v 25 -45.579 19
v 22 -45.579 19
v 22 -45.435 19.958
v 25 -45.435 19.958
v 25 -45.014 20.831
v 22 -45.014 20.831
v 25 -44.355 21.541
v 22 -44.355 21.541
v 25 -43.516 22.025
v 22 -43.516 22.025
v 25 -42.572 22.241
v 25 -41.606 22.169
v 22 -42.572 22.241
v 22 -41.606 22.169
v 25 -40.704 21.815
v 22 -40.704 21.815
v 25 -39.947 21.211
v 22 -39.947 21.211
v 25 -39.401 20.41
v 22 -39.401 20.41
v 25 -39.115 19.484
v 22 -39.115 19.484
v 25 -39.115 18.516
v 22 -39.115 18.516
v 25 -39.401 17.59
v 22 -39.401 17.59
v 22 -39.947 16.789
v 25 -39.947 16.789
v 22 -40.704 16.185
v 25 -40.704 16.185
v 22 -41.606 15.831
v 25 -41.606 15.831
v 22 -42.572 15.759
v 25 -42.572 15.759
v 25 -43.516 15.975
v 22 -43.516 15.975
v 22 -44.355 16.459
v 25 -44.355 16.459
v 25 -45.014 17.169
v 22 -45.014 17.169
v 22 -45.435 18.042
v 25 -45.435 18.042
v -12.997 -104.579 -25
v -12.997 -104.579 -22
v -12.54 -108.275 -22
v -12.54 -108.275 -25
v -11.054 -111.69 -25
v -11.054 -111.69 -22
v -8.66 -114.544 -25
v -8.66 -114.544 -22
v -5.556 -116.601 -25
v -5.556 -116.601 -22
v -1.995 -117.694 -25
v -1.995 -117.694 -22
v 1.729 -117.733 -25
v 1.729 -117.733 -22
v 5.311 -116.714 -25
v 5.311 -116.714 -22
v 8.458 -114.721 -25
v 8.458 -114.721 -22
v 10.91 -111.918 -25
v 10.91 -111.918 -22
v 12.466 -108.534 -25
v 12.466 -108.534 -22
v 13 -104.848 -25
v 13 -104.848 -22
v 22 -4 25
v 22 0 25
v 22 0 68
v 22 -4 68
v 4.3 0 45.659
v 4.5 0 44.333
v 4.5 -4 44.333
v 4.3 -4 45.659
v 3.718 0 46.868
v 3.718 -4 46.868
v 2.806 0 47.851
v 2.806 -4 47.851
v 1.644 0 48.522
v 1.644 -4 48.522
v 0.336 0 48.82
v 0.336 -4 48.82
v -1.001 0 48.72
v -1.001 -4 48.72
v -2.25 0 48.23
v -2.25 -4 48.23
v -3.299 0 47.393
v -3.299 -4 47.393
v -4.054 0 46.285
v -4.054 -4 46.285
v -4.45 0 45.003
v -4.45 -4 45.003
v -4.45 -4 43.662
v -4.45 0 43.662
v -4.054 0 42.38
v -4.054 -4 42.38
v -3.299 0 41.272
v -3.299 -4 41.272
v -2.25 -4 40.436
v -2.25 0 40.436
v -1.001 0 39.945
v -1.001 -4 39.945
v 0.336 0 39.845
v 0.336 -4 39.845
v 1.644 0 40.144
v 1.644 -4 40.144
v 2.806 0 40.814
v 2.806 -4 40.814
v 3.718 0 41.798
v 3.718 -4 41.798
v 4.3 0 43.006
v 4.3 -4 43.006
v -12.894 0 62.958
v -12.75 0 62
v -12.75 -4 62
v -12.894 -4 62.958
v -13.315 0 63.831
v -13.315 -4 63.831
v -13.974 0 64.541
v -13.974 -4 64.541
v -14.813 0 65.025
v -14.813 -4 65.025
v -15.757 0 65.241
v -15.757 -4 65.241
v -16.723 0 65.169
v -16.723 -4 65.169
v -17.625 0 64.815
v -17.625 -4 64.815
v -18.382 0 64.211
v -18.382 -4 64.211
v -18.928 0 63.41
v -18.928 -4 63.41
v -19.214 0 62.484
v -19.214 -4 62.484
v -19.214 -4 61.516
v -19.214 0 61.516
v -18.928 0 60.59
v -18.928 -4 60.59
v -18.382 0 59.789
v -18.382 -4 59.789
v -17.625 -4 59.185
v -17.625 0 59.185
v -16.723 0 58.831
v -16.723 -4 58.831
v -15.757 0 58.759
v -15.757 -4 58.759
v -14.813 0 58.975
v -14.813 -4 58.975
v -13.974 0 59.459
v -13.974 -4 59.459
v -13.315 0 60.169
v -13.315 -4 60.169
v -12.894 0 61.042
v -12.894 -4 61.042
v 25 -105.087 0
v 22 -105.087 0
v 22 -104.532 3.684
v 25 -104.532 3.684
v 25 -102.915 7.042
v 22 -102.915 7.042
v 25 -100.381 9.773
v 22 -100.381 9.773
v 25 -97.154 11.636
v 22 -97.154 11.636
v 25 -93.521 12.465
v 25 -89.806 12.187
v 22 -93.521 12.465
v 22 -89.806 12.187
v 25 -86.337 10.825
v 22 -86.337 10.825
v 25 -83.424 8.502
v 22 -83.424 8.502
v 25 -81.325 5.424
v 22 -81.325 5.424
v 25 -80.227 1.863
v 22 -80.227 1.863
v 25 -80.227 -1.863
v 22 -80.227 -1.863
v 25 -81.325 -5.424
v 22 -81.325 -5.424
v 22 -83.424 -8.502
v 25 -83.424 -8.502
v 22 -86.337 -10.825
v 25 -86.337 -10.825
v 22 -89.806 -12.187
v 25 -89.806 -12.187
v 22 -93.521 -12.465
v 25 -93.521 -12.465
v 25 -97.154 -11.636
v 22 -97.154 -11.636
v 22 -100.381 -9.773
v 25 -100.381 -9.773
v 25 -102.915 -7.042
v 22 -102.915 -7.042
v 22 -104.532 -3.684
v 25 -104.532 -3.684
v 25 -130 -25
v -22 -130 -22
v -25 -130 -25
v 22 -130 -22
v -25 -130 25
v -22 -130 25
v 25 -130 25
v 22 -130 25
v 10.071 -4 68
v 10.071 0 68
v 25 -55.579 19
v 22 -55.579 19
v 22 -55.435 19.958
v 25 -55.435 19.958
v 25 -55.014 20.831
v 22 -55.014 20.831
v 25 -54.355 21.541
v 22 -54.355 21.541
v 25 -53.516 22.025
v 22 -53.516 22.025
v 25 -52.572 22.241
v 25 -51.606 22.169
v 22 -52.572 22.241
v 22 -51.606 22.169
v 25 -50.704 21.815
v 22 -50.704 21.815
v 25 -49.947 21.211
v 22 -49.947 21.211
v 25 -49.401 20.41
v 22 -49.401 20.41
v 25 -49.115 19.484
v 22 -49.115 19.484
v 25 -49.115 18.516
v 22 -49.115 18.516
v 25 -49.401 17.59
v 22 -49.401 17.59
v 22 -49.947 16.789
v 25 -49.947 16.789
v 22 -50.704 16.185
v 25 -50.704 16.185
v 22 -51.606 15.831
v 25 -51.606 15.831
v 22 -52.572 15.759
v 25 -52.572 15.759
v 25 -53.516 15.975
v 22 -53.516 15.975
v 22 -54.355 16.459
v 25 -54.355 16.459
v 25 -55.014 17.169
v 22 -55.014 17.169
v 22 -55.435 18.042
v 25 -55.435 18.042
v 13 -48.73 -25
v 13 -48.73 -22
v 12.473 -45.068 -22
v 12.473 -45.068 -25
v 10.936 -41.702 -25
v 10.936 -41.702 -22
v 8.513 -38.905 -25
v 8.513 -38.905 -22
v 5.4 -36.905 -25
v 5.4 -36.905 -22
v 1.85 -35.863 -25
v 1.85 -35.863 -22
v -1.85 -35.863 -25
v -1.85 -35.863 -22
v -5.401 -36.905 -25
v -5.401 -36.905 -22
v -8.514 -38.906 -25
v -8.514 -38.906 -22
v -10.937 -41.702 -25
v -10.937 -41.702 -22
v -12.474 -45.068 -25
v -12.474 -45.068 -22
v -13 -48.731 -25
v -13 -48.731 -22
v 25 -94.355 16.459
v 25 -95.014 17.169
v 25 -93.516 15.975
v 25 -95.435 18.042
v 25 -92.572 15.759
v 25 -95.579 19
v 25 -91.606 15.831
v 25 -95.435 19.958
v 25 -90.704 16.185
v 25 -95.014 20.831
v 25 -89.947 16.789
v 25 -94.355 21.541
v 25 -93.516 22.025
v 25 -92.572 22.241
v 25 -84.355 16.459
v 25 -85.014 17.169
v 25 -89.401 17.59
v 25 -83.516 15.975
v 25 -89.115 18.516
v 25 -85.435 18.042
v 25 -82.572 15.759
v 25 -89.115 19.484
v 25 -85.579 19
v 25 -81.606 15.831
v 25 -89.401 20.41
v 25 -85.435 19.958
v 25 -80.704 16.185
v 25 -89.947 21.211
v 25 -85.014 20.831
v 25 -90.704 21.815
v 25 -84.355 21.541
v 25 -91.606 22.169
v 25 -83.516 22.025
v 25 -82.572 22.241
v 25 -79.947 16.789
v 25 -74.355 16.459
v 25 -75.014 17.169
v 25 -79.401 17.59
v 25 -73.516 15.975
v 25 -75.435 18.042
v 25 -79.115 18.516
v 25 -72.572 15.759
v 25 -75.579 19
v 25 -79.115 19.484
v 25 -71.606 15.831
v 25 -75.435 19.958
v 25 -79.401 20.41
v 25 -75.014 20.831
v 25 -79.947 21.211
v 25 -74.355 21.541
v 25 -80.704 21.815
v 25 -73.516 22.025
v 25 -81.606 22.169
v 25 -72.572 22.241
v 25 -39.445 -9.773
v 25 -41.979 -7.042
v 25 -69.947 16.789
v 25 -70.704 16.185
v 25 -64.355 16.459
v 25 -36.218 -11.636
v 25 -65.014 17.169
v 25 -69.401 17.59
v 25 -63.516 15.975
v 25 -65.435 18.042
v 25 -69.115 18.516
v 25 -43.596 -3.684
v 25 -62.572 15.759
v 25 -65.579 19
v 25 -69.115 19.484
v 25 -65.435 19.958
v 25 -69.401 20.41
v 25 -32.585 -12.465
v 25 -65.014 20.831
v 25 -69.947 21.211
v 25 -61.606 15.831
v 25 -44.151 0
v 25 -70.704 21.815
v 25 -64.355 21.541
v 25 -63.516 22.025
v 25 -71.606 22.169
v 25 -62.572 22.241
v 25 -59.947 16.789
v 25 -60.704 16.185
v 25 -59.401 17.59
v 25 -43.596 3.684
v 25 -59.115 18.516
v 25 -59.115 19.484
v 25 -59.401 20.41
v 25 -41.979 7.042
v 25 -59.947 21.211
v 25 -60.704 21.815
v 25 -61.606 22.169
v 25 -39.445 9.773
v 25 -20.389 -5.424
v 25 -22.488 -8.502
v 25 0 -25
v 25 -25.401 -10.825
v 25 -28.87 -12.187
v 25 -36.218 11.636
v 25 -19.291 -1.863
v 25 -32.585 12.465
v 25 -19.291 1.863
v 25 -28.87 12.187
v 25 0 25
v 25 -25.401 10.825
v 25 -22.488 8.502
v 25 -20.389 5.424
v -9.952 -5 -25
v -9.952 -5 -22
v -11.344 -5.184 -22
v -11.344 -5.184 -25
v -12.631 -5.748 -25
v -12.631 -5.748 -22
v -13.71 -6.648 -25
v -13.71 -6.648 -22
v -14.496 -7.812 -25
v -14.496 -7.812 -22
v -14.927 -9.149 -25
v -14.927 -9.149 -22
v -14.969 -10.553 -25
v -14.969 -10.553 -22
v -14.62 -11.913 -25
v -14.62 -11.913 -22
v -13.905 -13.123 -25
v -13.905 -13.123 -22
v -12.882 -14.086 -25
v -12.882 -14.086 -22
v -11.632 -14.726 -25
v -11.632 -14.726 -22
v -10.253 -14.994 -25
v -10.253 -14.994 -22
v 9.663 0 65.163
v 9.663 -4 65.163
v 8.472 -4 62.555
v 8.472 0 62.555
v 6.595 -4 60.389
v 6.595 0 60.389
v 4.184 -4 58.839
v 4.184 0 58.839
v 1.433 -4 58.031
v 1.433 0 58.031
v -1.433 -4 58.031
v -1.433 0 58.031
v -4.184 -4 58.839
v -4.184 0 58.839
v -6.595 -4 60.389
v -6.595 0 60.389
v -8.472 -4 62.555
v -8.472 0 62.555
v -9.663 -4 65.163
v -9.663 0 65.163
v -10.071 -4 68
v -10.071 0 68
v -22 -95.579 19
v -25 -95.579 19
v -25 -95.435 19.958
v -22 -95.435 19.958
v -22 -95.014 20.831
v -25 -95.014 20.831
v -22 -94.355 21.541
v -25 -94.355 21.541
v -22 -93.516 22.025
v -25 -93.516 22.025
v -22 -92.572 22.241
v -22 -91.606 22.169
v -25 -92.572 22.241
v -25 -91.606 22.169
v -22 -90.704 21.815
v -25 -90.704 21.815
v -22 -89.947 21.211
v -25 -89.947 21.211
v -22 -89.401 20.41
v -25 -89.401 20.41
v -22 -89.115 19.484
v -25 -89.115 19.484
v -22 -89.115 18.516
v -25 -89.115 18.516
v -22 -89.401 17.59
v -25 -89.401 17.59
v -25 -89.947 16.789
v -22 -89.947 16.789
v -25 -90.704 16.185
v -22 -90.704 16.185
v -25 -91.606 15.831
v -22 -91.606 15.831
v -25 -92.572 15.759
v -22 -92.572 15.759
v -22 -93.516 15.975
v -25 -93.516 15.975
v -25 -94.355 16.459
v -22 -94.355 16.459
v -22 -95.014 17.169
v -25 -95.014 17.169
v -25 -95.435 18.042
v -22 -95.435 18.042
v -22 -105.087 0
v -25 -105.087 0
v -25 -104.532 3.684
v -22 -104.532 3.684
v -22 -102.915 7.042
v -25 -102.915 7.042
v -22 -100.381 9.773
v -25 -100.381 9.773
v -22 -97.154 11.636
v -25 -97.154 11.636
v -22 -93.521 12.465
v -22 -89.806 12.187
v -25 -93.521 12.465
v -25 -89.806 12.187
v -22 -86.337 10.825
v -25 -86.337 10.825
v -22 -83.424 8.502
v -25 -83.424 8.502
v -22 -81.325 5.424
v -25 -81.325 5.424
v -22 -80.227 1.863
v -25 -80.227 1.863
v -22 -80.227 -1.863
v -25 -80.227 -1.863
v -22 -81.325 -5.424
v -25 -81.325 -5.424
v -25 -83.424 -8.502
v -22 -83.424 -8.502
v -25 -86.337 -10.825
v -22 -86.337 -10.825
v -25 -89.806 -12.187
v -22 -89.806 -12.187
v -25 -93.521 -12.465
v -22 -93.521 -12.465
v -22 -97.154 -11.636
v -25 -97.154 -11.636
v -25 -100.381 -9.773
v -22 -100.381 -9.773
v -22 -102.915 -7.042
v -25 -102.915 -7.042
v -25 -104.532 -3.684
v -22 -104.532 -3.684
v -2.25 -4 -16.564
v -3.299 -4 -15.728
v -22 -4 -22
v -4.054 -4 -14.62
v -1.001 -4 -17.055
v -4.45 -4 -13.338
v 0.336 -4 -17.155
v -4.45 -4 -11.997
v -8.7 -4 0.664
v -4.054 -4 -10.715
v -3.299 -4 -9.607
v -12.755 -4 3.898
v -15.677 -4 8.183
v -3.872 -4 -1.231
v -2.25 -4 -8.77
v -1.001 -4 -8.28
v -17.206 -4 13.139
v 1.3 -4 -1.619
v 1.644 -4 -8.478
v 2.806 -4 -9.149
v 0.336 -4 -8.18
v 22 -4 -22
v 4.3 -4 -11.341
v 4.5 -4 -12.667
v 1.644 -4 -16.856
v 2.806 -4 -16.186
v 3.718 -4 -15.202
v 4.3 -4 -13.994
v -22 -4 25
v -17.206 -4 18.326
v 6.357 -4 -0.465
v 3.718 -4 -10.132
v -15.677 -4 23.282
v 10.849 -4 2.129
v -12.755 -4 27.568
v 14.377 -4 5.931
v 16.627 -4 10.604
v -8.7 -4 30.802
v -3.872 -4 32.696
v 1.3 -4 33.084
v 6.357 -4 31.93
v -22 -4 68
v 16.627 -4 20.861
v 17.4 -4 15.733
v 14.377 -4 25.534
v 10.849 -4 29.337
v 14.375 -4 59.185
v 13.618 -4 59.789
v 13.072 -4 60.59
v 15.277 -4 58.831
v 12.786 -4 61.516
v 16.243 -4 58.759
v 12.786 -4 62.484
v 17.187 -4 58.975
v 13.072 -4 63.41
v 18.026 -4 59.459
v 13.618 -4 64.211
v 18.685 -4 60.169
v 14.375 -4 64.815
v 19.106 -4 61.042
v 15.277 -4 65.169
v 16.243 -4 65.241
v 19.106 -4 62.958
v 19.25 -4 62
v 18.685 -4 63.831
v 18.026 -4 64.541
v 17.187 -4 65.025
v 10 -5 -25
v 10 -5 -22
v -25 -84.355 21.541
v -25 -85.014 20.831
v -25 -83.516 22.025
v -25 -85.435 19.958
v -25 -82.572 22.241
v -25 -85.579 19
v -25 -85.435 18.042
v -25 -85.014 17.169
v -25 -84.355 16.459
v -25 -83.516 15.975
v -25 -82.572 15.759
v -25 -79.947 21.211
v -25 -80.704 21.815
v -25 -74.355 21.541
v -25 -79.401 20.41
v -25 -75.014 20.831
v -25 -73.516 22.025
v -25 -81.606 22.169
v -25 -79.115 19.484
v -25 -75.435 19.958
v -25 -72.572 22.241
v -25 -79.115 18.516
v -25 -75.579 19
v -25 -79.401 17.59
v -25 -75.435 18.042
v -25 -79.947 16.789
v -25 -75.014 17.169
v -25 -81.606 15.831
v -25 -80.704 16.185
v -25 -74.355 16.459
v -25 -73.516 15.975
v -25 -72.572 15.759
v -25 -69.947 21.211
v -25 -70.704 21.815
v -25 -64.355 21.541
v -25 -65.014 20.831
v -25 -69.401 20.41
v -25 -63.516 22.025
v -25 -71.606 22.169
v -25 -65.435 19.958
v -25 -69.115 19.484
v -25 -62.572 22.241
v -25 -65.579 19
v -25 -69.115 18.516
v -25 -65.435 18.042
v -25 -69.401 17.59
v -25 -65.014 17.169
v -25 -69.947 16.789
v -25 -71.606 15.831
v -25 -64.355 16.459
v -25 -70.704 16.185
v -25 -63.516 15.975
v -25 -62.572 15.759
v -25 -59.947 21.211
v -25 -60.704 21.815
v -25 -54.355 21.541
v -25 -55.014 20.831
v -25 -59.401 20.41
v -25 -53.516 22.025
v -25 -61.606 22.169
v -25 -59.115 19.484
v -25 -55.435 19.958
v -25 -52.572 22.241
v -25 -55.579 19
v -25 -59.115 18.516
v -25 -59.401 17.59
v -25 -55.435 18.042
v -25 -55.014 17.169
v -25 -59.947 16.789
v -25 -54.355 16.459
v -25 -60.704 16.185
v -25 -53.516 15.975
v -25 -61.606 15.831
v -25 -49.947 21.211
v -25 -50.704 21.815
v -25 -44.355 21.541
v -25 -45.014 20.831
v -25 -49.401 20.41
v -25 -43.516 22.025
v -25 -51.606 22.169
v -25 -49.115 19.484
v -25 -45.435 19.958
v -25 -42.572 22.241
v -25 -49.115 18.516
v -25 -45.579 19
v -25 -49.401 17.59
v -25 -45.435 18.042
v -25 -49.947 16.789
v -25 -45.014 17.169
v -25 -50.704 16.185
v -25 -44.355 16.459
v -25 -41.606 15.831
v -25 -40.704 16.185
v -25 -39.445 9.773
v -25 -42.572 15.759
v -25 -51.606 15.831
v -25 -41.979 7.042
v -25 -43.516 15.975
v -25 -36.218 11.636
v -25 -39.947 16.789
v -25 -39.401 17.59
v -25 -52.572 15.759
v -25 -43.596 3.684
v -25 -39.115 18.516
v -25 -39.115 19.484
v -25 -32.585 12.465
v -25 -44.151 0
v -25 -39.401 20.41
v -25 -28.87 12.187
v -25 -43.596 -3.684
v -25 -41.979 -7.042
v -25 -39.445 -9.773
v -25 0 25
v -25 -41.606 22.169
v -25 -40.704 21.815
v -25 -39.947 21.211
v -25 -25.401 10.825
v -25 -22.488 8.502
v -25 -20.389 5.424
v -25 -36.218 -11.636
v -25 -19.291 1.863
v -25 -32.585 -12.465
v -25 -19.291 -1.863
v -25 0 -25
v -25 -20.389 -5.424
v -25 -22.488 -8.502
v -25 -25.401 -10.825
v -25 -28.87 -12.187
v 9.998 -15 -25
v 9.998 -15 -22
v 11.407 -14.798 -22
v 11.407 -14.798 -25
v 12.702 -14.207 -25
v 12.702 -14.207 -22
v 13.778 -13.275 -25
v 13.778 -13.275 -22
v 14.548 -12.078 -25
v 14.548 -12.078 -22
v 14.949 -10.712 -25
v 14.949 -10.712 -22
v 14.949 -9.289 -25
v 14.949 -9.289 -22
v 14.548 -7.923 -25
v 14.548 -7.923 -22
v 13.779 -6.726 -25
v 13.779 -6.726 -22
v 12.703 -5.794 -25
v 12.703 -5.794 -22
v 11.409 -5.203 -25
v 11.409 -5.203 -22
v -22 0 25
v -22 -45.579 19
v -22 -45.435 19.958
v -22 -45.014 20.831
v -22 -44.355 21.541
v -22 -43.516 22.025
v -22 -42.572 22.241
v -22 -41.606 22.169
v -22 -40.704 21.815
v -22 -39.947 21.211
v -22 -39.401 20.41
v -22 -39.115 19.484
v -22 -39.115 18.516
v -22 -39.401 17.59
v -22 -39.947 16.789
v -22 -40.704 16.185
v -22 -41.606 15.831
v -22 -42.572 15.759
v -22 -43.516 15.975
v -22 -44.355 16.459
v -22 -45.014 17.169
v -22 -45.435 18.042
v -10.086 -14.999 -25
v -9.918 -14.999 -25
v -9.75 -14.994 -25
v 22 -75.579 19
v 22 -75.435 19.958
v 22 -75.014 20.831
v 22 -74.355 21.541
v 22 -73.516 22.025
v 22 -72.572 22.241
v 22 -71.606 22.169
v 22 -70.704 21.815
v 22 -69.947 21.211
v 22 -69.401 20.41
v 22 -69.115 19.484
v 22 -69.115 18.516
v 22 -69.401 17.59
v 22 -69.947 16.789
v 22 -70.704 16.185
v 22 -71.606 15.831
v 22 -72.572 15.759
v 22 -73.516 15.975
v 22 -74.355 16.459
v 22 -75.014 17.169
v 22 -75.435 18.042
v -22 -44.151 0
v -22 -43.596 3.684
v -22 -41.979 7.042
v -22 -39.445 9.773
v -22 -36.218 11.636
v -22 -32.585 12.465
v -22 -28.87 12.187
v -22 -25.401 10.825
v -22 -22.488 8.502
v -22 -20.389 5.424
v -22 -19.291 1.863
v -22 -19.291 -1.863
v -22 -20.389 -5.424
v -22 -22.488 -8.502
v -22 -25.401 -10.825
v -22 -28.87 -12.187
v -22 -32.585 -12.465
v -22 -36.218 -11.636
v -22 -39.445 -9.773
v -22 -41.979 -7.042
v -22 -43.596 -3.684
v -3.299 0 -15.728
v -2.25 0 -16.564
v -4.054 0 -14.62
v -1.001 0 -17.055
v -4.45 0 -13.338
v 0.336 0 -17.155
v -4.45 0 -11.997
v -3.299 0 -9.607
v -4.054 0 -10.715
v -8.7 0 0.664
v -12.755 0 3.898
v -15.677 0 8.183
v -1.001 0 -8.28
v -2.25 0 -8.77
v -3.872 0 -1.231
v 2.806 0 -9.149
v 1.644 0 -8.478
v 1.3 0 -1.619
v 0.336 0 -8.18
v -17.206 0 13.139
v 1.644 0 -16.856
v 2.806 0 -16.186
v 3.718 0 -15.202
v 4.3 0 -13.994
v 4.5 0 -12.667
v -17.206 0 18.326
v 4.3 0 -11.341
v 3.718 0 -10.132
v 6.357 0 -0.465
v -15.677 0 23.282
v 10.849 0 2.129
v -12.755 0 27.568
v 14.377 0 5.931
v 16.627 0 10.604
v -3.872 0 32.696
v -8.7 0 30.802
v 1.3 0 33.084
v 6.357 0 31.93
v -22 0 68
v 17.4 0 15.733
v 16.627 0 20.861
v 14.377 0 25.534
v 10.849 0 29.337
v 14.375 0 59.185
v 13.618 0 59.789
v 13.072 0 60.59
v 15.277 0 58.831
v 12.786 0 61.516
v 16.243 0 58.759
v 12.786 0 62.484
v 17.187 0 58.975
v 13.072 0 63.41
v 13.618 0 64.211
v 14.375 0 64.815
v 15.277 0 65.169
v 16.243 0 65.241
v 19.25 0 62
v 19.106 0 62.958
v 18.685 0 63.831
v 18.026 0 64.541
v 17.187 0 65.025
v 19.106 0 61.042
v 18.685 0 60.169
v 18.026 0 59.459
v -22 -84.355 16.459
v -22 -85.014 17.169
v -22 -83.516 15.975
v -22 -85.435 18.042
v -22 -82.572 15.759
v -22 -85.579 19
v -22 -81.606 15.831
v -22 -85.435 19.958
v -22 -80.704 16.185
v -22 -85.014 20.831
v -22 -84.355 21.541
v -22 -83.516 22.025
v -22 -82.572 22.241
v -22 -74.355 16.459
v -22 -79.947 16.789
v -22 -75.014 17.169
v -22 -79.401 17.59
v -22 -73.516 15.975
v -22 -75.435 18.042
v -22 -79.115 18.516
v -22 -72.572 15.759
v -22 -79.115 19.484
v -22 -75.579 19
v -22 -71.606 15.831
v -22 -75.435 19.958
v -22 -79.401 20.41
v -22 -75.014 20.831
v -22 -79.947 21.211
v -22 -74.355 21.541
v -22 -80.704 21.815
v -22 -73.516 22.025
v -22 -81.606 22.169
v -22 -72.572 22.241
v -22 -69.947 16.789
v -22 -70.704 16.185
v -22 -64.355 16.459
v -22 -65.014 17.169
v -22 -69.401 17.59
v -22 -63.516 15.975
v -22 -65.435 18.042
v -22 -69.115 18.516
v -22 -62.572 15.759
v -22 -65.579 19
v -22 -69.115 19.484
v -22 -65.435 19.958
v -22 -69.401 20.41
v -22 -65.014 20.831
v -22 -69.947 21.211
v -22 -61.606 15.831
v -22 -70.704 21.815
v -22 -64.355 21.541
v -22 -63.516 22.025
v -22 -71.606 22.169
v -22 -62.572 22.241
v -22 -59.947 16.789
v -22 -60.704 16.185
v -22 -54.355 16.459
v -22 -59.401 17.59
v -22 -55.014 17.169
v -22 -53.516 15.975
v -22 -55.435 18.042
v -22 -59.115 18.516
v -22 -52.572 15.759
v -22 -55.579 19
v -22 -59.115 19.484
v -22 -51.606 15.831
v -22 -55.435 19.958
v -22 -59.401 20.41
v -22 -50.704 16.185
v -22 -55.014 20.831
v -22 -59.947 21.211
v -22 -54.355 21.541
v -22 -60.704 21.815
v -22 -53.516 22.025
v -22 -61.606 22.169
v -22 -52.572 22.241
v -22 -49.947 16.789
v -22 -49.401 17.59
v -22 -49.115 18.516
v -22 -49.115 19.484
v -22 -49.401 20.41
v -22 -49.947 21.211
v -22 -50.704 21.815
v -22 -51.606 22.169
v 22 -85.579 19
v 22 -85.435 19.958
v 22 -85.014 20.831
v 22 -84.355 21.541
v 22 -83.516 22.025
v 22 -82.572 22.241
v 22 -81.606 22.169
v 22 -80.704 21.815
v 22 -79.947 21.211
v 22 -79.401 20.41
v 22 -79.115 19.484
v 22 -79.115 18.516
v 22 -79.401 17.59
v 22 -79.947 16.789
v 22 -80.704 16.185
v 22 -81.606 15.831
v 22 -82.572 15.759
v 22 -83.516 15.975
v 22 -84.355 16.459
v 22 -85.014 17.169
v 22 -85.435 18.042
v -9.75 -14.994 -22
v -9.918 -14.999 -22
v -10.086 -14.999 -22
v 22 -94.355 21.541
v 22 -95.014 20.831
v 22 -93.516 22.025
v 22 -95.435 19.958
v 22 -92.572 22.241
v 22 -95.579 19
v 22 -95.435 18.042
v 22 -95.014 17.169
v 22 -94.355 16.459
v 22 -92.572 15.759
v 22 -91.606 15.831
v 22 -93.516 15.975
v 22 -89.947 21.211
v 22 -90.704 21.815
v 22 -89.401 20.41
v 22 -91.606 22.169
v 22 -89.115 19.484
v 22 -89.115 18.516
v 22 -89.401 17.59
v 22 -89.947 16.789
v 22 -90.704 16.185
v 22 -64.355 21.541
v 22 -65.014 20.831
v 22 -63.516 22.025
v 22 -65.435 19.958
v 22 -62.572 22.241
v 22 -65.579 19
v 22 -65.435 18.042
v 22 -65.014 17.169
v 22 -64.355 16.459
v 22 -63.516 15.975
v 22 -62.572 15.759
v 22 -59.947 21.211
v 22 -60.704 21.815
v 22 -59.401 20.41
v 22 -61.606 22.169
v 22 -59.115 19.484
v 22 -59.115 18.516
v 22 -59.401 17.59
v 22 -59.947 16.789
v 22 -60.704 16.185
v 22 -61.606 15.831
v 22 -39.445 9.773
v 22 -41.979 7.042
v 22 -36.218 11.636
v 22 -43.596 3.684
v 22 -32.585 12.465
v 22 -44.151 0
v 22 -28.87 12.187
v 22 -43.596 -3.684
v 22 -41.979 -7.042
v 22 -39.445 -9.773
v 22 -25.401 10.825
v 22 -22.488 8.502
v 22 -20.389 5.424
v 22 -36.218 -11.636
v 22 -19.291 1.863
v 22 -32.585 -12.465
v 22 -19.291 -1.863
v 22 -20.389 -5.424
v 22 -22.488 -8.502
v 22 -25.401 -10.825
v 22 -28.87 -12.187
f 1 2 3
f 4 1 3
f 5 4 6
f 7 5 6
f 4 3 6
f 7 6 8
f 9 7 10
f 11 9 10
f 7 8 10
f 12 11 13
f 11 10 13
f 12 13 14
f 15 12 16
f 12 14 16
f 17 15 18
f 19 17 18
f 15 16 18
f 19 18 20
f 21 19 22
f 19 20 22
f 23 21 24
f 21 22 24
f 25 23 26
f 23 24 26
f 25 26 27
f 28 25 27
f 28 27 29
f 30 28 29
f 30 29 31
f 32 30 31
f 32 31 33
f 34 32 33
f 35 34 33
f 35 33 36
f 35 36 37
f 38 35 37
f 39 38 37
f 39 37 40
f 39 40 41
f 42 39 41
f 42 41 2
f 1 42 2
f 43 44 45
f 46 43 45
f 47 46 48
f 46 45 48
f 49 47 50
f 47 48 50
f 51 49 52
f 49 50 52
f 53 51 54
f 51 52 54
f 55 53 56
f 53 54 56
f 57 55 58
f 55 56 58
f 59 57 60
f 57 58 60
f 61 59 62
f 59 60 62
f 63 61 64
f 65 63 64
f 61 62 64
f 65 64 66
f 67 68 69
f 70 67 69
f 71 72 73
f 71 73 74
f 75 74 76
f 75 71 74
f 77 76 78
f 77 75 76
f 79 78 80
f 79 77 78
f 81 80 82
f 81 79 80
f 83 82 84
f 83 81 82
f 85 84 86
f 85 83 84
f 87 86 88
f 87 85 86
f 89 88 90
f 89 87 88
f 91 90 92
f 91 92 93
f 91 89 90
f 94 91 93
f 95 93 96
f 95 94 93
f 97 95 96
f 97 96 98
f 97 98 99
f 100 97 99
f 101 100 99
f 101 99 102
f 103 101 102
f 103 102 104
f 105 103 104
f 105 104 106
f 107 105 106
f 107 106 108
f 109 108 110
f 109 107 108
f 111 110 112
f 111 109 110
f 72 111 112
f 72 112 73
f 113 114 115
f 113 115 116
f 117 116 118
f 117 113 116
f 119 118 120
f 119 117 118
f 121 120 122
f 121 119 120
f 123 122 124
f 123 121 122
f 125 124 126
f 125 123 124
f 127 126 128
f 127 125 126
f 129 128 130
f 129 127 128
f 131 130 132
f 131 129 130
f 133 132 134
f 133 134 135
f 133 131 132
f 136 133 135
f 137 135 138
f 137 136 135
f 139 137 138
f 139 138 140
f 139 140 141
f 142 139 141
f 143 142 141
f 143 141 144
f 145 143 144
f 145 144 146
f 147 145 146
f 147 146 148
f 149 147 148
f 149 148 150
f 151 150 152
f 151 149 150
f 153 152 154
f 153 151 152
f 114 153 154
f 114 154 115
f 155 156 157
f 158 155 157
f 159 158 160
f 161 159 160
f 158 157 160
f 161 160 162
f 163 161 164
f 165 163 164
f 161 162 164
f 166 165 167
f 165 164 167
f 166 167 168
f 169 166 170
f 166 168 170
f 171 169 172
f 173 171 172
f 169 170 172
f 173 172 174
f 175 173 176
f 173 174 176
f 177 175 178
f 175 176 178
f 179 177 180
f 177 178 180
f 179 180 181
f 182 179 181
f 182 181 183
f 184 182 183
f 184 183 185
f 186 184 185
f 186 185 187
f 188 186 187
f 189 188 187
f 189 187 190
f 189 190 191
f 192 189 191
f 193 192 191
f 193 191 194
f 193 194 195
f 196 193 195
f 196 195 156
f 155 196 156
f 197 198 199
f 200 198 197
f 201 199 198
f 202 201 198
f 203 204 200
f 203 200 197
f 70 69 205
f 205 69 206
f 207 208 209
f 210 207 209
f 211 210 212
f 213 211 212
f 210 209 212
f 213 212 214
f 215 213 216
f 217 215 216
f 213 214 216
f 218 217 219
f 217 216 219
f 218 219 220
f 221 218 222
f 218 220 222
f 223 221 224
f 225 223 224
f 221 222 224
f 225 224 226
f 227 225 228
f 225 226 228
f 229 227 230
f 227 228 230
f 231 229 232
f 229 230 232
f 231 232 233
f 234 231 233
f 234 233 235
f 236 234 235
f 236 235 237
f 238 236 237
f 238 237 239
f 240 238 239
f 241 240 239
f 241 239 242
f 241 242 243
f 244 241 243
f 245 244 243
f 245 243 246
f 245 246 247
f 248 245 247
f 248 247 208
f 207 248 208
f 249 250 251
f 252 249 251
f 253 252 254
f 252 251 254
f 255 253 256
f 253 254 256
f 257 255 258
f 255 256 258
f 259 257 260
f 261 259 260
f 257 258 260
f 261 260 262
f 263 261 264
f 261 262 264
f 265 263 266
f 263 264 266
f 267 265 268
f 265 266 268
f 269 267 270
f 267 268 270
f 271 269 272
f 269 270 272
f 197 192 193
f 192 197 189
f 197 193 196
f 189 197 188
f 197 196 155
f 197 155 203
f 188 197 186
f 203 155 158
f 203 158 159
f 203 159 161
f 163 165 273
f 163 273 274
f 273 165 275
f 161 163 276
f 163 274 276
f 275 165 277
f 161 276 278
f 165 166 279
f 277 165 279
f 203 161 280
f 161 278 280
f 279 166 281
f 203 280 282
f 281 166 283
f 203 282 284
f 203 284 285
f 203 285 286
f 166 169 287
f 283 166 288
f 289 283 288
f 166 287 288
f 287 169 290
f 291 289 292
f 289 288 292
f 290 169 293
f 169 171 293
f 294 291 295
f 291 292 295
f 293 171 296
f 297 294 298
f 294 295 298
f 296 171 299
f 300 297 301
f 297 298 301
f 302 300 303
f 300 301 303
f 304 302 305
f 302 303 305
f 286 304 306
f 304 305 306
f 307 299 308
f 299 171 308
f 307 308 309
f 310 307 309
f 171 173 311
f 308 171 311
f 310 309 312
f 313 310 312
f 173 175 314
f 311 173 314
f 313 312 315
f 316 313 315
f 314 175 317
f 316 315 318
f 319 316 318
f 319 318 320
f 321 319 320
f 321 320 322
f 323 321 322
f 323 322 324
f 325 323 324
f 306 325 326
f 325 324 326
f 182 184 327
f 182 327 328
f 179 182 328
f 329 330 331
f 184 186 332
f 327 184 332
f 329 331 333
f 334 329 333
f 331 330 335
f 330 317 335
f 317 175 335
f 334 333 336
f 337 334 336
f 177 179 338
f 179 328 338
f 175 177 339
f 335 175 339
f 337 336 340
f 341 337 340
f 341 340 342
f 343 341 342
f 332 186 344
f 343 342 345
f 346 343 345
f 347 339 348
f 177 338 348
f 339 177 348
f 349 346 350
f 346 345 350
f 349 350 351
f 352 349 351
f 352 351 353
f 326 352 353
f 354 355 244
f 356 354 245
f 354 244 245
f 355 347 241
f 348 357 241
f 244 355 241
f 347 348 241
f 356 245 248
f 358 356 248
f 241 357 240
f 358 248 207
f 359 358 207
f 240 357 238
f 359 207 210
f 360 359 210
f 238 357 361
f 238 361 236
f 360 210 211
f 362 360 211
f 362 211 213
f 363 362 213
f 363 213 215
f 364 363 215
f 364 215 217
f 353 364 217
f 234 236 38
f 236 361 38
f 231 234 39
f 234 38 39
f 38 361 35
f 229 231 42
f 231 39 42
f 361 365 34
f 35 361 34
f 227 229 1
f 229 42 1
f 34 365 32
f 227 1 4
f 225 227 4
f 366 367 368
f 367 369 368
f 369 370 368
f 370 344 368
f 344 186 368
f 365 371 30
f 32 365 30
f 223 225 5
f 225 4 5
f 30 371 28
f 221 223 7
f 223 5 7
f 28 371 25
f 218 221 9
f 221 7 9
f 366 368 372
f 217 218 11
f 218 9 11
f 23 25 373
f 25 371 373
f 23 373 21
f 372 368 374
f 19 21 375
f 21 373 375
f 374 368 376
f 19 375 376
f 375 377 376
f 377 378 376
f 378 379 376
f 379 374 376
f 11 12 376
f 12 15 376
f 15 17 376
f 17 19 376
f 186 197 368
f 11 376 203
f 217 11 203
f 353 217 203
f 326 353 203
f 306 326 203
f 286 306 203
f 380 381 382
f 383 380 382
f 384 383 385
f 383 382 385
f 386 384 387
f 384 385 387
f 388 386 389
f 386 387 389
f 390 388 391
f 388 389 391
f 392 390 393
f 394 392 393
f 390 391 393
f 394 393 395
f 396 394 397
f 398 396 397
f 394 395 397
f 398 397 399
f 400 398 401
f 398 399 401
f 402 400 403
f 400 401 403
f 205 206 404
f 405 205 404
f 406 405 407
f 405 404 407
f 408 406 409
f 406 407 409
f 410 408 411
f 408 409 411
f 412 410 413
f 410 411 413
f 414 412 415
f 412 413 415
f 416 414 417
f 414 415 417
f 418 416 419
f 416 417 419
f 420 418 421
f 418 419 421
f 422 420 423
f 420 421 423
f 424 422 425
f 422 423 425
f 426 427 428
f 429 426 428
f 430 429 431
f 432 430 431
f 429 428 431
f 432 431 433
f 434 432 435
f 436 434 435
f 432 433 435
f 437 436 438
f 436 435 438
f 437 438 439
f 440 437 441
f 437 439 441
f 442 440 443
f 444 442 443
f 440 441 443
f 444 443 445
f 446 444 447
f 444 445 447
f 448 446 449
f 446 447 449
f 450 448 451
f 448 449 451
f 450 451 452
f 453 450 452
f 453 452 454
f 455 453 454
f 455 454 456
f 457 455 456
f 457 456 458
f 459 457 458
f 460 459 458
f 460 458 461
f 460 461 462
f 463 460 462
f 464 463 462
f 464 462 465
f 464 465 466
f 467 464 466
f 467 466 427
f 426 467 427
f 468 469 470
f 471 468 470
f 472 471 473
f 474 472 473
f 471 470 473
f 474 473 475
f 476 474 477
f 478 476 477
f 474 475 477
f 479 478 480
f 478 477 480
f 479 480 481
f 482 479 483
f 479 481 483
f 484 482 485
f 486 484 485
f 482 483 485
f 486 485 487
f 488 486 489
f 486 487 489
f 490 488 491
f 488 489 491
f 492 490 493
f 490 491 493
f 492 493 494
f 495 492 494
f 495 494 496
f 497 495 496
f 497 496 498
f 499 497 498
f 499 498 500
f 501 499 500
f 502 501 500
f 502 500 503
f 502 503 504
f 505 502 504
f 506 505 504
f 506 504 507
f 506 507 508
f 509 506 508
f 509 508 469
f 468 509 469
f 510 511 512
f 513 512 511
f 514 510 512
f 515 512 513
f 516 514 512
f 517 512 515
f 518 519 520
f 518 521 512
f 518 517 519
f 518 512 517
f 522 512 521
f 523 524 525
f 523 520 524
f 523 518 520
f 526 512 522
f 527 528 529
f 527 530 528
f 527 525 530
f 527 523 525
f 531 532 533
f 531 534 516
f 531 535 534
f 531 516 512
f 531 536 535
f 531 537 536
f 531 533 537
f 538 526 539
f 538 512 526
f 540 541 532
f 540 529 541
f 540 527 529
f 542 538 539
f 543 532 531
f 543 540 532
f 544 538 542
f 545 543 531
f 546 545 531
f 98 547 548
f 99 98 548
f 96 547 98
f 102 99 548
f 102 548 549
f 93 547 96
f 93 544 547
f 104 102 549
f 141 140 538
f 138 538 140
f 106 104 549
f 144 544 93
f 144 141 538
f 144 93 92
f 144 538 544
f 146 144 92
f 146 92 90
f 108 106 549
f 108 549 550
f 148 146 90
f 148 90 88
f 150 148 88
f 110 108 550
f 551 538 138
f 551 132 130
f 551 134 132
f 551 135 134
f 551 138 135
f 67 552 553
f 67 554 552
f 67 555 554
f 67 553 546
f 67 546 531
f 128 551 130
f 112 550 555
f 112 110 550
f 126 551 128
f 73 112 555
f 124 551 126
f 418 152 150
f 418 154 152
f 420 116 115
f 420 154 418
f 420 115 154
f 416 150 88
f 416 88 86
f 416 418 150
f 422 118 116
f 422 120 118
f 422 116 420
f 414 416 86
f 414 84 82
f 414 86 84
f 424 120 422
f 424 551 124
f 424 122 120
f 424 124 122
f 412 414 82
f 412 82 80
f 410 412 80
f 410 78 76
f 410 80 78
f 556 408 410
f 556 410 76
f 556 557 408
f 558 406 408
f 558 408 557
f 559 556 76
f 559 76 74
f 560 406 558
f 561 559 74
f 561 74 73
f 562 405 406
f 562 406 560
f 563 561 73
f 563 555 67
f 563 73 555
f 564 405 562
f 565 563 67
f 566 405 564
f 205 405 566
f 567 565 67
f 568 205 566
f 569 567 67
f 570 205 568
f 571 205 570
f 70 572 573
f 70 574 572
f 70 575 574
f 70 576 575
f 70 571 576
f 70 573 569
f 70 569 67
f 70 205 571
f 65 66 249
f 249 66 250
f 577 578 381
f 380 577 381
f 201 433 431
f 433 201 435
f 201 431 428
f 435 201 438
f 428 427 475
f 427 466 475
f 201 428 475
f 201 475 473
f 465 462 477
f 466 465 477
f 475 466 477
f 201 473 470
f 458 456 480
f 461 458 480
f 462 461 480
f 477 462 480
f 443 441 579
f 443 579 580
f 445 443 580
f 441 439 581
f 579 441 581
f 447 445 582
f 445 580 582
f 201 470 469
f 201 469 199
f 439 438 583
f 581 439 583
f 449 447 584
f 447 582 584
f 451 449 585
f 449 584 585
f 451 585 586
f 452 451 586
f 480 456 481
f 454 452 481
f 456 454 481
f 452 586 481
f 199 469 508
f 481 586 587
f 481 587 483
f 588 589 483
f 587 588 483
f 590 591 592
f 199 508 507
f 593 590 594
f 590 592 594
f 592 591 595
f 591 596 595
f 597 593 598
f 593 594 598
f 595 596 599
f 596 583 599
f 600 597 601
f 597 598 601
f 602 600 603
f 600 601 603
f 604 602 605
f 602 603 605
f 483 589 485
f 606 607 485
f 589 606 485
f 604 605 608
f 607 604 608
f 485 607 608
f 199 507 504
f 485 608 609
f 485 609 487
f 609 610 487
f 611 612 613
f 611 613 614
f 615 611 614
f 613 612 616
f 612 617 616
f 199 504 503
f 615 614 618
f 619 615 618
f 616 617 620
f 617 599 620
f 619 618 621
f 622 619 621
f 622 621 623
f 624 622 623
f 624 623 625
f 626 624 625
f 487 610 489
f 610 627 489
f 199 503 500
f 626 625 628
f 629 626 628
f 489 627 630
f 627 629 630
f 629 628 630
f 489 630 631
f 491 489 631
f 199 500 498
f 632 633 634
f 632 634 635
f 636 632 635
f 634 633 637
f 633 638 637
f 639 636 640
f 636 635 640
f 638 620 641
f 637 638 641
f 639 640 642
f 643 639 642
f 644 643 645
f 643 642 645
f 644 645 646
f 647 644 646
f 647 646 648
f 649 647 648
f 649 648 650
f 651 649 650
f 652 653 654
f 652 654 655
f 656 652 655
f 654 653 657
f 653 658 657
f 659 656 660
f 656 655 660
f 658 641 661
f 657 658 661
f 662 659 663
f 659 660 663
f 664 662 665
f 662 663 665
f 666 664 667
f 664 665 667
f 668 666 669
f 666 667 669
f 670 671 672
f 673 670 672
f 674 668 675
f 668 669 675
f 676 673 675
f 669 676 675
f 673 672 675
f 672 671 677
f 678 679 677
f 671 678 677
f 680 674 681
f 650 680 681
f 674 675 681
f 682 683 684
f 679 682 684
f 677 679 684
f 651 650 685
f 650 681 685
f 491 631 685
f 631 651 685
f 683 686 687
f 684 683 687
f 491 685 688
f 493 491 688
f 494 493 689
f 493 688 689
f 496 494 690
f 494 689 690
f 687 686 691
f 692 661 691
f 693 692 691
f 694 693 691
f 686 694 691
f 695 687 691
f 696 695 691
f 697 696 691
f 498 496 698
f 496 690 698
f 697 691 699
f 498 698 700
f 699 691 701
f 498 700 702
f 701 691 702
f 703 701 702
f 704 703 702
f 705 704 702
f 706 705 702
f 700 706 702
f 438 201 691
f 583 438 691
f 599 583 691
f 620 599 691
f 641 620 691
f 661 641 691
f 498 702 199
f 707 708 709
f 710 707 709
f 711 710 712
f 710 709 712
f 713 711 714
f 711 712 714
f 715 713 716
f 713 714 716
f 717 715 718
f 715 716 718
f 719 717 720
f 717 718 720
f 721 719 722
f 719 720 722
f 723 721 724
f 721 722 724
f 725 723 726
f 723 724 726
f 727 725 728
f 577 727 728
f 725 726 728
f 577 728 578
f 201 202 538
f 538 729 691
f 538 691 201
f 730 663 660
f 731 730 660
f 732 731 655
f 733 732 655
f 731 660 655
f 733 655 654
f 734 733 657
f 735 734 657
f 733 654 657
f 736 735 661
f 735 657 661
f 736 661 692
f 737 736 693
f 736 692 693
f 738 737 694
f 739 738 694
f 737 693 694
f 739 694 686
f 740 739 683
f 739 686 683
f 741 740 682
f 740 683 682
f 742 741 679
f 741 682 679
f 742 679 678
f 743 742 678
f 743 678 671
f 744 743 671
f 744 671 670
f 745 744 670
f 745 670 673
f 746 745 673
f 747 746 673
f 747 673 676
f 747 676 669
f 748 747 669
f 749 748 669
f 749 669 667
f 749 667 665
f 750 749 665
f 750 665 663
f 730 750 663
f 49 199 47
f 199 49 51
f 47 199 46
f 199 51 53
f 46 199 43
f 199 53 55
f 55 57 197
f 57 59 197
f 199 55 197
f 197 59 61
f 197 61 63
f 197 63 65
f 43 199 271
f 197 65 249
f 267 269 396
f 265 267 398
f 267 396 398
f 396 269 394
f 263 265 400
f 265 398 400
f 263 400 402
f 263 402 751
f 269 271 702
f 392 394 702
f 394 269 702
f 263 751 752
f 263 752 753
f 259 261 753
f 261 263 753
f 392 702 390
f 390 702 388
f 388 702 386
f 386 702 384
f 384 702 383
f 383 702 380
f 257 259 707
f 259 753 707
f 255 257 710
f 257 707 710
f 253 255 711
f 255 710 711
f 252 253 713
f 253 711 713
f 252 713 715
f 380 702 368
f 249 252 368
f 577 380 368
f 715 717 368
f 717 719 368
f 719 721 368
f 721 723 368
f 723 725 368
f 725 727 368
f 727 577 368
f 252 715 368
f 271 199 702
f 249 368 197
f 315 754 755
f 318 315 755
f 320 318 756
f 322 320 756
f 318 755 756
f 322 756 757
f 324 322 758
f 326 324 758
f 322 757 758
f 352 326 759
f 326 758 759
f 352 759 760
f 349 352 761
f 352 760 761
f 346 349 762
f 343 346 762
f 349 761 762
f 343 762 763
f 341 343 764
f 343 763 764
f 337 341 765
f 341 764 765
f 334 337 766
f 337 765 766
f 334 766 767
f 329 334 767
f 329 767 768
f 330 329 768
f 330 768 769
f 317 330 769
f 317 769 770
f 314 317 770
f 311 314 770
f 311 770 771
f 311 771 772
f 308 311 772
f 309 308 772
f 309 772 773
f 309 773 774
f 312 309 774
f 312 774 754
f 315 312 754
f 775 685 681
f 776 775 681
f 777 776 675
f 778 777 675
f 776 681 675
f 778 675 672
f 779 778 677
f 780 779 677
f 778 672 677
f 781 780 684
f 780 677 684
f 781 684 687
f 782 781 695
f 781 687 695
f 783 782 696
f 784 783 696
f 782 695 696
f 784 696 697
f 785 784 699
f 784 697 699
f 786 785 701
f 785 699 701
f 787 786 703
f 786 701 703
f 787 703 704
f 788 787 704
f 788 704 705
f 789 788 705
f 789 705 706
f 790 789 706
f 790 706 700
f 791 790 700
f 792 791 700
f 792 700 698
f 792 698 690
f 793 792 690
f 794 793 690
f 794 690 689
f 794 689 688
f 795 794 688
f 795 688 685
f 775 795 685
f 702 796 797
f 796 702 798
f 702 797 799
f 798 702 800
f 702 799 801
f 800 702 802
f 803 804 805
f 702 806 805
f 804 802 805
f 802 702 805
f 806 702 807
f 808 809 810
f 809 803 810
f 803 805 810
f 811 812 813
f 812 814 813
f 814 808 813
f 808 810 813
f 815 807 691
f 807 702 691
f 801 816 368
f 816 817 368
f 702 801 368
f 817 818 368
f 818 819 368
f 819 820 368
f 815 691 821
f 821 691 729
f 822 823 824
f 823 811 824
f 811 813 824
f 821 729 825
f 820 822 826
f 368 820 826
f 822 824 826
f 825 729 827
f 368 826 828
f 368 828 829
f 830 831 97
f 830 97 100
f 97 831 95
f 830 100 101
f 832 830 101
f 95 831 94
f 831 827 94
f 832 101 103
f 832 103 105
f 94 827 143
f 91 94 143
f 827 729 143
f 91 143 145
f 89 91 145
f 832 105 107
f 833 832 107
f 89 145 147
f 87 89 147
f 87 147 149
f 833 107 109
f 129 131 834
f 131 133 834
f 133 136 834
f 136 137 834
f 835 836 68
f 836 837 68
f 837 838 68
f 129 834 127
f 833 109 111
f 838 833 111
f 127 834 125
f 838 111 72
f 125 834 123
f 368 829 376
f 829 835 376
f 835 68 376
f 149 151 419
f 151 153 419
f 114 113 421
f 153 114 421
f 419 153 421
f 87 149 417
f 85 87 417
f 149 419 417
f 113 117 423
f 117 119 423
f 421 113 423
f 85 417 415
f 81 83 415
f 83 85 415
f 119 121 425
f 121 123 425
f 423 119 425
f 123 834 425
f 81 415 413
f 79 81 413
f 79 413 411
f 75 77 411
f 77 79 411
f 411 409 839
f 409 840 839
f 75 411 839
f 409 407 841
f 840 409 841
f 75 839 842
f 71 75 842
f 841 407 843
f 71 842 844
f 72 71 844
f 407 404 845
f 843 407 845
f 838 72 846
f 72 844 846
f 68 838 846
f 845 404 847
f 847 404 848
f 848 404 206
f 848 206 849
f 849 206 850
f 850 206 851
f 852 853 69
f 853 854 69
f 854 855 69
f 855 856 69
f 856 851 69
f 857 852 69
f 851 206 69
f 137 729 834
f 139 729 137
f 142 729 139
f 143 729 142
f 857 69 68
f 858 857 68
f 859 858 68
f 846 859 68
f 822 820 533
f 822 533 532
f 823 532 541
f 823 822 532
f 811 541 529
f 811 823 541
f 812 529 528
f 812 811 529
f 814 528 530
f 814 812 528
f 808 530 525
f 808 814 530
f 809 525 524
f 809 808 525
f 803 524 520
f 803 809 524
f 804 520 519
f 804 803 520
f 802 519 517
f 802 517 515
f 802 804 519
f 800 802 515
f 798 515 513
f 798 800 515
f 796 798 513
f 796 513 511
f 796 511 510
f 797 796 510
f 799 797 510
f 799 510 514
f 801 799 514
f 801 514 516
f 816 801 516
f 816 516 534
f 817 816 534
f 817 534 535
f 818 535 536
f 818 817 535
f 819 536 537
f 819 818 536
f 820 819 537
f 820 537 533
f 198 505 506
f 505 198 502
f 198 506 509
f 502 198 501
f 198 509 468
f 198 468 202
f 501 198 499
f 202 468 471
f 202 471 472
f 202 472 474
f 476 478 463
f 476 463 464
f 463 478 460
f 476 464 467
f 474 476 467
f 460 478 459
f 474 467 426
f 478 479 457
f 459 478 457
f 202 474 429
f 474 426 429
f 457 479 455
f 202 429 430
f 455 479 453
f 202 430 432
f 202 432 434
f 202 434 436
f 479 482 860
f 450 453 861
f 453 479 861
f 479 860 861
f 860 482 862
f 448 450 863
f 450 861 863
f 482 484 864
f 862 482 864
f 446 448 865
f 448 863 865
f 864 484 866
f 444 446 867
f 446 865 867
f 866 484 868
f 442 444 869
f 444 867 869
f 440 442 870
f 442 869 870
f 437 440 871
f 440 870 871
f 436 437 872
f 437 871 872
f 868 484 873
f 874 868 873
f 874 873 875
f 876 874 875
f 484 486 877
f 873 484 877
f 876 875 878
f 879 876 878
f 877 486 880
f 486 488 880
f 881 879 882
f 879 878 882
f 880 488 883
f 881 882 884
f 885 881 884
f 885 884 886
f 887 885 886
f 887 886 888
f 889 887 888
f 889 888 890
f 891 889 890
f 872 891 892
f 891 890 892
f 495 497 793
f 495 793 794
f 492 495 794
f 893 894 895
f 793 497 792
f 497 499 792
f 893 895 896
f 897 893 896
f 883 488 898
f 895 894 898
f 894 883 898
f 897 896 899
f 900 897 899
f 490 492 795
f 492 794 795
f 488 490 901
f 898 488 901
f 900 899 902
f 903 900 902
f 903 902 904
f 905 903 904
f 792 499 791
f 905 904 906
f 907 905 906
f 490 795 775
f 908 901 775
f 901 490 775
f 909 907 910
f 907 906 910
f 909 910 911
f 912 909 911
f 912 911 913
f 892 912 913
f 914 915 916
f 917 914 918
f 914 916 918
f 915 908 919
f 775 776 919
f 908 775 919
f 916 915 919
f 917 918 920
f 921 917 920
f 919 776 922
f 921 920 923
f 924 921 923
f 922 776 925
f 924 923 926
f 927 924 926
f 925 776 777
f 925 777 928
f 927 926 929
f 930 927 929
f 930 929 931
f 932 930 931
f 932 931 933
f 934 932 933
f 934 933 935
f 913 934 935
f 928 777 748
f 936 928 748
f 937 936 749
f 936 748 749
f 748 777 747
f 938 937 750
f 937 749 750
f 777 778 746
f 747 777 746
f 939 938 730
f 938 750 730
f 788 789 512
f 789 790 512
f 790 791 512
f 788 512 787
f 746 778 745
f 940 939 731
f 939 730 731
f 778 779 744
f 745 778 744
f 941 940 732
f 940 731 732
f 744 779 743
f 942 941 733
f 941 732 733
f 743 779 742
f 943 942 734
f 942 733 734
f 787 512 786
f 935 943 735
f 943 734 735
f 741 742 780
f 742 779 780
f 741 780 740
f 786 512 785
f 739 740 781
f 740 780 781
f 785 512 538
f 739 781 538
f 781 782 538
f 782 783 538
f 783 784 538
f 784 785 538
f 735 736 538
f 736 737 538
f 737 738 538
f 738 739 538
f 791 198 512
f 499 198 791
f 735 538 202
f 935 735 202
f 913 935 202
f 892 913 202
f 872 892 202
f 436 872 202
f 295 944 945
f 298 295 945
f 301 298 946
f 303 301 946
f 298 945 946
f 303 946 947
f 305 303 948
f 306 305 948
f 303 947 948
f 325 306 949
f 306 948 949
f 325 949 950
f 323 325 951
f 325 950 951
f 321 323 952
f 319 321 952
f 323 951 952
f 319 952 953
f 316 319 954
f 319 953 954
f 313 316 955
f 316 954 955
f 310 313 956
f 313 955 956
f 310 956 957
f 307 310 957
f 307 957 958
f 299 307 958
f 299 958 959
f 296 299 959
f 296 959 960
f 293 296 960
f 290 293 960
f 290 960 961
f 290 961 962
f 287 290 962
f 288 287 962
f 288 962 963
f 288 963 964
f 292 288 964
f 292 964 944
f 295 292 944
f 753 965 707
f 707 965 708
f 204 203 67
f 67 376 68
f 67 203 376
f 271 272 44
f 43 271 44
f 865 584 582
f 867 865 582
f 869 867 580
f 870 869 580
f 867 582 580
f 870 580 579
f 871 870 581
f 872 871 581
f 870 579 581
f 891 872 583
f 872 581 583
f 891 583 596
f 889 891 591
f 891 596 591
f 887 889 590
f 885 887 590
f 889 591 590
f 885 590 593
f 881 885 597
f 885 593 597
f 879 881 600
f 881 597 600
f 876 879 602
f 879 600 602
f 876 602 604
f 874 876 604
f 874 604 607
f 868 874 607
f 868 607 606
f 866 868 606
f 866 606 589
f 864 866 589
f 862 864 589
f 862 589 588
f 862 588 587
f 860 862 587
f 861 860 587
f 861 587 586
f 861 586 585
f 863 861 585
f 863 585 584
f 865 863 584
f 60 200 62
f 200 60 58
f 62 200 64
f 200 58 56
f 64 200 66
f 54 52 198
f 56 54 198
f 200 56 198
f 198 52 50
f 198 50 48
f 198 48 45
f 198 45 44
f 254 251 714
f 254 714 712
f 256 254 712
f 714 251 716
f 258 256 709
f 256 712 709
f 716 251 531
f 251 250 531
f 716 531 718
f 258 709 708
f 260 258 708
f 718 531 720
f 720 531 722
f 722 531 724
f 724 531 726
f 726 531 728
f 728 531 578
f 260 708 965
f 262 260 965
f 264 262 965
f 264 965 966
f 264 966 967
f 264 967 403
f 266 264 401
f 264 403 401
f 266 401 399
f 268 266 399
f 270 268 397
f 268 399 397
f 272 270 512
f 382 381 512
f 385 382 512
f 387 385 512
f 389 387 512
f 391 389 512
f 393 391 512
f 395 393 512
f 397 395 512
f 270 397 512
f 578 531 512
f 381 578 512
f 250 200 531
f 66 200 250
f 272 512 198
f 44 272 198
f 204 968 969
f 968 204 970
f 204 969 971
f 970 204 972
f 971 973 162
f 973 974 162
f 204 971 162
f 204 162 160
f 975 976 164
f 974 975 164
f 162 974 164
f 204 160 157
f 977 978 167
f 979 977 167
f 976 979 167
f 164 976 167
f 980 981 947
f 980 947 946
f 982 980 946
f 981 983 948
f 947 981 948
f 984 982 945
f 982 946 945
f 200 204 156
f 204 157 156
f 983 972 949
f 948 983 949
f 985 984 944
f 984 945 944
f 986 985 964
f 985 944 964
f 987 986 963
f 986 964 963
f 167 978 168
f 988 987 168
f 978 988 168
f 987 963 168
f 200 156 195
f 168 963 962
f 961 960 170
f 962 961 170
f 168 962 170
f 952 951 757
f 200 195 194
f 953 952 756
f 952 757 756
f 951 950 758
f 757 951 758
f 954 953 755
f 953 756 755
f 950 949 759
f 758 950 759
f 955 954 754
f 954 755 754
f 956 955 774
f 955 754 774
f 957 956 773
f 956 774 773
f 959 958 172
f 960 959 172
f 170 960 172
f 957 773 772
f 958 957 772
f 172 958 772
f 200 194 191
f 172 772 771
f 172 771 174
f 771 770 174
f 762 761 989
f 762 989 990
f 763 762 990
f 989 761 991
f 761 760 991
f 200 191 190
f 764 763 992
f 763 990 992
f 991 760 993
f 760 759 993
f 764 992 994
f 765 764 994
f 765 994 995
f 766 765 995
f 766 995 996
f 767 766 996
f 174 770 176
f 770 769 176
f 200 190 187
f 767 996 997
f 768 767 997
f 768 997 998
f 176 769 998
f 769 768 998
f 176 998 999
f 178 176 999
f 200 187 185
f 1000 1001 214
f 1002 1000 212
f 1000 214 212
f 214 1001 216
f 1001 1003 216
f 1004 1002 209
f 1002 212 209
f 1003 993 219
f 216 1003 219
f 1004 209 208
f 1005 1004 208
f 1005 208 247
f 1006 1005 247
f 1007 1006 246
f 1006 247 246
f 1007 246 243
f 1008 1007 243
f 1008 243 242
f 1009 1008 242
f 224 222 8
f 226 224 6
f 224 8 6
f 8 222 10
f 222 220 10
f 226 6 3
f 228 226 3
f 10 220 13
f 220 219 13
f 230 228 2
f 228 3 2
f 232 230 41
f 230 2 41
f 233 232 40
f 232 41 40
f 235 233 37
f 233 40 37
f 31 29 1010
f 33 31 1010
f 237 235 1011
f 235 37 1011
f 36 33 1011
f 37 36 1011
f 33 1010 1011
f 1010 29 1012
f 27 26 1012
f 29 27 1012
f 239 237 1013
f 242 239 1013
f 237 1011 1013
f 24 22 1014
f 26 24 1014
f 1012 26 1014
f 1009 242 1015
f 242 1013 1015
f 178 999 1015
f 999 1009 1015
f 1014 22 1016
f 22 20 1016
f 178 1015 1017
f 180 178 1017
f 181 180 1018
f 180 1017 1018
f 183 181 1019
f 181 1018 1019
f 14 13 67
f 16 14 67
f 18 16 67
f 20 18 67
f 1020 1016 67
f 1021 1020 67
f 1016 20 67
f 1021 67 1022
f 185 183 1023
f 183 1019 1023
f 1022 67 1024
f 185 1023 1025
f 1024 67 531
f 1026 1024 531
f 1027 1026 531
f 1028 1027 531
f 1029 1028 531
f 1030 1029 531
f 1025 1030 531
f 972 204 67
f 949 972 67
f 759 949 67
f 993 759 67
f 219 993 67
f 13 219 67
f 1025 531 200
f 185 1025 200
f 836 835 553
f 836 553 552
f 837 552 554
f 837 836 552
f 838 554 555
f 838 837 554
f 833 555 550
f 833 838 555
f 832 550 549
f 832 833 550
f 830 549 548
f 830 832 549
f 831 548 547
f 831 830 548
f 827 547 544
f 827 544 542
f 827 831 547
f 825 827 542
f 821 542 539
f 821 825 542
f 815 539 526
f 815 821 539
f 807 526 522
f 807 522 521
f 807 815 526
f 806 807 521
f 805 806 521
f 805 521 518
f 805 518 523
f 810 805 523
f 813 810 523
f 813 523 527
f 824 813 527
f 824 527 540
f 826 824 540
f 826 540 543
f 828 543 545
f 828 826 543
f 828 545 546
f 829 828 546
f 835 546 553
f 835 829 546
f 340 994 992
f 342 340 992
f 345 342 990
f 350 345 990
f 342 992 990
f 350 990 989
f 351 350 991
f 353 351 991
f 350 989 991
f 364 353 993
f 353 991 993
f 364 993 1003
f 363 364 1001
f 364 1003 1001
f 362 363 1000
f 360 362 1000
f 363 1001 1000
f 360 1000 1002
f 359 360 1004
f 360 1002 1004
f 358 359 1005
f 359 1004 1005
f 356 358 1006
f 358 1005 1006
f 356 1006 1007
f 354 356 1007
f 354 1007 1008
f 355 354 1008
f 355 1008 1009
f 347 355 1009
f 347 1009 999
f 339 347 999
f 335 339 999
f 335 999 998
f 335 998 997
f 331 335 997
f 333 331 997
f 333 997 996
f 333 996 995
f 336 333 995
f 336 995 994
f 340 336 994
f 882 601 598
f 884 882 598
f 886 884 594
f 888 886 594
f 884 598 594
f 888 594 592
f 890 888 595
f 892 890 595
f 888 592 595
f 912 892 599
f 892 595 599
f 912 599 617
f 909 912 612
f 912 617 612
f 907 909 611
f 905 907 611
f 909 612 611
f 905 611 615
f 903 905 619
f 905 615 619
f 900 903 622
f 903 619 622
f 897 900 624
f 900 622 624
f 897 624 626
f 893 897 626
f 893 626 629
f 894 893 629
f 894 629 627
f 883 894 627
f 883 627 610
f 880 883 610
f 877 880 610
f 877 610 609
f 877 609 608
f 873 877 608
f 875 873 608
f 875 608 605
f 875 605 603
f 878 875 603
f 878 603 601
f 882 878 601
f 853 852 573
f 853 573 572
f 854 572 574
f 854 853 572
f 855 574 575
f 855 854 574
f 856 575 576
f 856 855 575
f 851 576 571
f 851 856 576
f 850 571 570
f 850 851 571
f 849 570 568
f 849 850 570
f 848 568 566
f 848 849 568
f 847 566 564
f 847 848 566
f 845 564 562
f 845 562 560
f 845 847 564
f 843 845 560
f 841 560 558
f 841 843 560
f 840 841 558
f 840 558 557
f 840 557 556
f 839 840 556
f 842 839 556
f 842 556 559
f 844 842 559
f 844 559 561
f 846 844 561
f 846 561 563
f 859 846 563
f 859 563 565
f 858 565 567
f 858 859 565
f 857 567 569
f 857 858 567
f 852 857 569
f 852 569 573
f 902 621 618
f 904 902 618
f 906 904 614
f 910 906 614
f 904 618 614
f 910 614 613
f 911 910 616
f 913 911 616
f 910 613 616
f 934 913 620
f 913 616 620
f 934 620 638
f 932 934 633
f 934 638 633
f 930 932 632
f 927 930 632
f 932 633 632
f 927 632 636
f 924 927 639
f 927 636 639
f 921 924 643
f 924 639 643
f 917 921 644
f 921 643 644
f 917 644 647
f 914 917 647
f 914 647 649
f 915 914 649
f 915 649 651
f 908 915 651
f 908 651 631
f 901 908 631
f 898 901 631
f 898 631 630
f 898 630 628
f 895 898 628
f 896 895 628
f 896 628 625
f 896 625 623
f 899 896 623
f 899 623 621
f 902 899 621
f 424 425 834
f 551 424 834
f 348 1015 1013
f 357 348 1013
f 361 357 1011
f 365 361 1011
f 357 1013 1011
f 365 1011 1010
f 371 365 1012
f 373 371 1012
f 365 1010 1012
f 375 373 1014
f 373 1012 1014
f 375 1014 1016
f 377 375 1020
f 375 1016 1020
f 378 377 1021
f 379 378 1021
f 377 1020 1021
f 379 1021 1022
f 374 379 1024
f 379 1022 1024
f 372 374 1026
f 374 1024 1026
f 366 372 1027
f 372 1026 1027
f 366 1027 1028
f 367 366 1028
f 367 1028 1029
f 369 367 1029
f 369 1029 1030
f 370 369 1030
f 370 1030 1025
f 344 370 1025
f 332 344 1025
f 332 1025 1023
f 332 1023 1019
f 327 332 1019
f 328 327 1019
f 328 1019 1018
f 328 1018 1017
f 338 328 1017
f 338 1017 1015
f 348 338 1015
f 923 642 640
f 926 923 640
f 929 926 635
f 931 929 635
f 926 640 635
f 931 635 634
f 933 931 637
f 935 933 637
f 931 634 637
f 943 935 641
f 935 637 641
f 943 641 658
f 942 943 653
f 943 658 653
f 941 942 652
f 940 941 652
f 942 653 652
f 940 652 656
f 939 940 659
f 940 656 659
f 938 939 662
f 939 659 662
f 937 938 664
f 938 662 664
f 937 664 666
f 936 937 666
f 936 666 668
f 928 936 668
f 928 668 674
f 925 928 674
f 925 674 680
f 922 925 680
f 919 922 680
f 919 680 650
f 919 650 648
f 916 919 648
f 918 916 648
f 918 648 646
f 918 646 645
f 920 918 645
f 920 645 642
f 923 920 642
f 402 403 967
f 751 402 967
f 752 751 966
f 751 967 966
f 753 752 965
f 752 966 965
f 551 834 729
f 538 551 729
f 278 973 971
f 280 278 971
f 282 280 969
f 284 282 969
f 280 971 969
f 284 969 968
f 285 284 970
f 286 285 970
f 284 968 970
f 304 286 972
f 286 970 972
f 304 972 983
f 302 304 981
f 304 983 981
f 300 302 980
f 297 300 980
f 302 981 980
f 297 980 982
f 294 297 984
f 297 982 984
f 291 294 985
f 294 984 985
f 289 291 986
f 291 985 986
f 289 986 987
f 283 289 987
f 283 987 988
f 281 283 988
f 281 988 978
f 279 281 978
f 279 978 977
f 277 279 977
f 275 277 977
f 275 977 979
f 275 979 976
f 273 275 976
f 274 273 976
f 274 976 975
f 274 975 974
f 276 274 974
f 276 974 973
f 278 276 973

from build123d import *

# Parameters (mm, degrees)
F1_DEPTH  = 130
F2_R      = 4.5
F2_R_2    = 17.4
F2_R_3    = 3.25
F3_DEPTH  = 4
F1_FACE_W = 50
F1_FACE_H = 130
F5_DEPTH  = 25.001
F7_R      = 12.5
F8_DEPTH  = 50.001
F7_R_2    = 3.25
F9_DEPTH  = 50.001


with BuildPart() as f1:
    # F0 (on Front) → F1 (new body)
    with BuildSketch(Plane.XZ):
        Polygon((25, -25), (25, 25), (22, 25), (22, -22), (-22, -22), (-22, 25), (-25, 25), (-25, -25), align=None)
    extrude(amount=F1_DEPTH)

    # F2 (on Front) → F3 (join)
    with BuildSketch(Plane.XZ):
        with BuildLine():
            Line((-22, 25), (-22, -22))
            Line((-22, -22), (22, -22))
            Line((22, -22), (22, 68))
            Line((22, 68), (10.0712478979, 68))
            ThreePointArc((10.0712478979, 68), (0, 57.9287521021), (-10.0712478979, 68))
            Line((-10.0712478979, 68), (-22, 68))
            Line((-22, 68), (-22, 25))
        make_face()
        with Locations((0, -12.6673281193)):
            Circle(F2_R, mode=Mode.SUBTRACT)
        with Locations((0, 15.7326718807)):
            Circle(F2_R_2, mode=Mode.SUBTRACT)
        with Locations((-16, 62)):
            Circle(F2_R_3, mode=Mode.SUBTRACT)
        with Locations((0, 44.3326718807)):
            Circle(F2_R, mode=Mode.SUBTRACT)
        with Locations((16, 62)):
            Circle(F2_R_3, mode=Mode.SUBTRACT)
    extrude(amount=F3_DEPTH)

    # F4 (on Top) + F1_face (on face) → F5 (cut, through all)
    with BuildSketch(Plane.XY):
        with BuildLine():
            Line((-12.9999999838, -48.7308816649), (-12.9972082527, -104.5789601389))
            ThreePointArc((-12.9972082527, -104.5789601389), (-0.1347084156, -117.8476645499), (13, -104.8483625054))
            Line((13, -104.8483625054), (13, -48.7302318215))
            ThreePointArc((13, -48.7302318215), (-0.0003249217, -35.7302318256), (-12.9999999838, -48.7308816649))
        make_face()
        with BuildLine():
            Line((9.9999410594, -5.0000000003), (-9.9515041286, -5.0002351905))
            ThreePointArc((-9.9515041286, -5.0002351905), (-14.9977215138, -9.8490706455), (-10.2532994666, -14.9935798161))
            Line((-10.2532994666, -14.9935798161), (-9.7498665822, -14.9937394078))
            Line((-9.7498665822, -14.9937394078), (9.9984149657, -14.9999997488))
            ThreePointArc((9.9984149657, -14.9999997488), (14.9999999418, -10.0007630468), (9.9999410594, -5.0000000003))
        make_face()
        with BuildLine():
            Line((-9.7498665822, -14.9937394078), (-10.2532994666, -14.9935798161))
            ThreePointArc((-10.2532994666, -14.9935798161), (-10.0015850343, -14.9999997488), (-9.7498665822, -14.9937394078))
        make_face()
    with BuildSketch(Plane(origin=(0, -65, -25), x_dir=(1, 0, 0), z_dir=(0, 0, -1))):
        Rectangle(F1_FACE_W, F1_FACE_H)
    extrude(amount=-F5_DEPTH, dir=(0, 0, 1), mode=Mode.SUBTRACT)

    # F7 (on face) → F8 (cut, through all)
    with BuildSketch(Plane(origin=(-25, 0, 0), x_dir=(0, -1, 0), z_dir=(-1, 0, 0))):
        with Locations((31.6511541605, 0)):
            Circle(F7_R)
        with Locations((92.5872474909, 0)):
            Circle(F7_R)
    extrude(amount=-F8_DEPTH, mode=Mode.SUBTRACT)

    # F7 (on face) → F9 (cut, through all)
    with BuildSketch(Plane(origin=(-25, 0, 0), x_dir=(0, -1, 0), z_dir=(-1, 0, 0))):
        with Locations((92.5872474909, 0)):
            Circle(F7_R)
        with Locations((31.6511541605, 0)):
            Circle(F7_R)
        with Locations((92.3290103674, 19)):
            Circle(F7_R_2)
        with Locations((82.3290103674, 19)):
            Circle(F7_R_2)
        with Locations((72.3290103674, 19)):
            Circle(F7_R_2)
        with Locations((62.3290103674, 19)):
            Circle(F7_R_2)
        with Locations((52.3290103674, 19)):
            Circle(F7_R_2)
        with Locations((42.3290103674, 19)):
            Circle(F7_R_2)
    extrude(amount=-F9_DEPTH, mode=Mode.SUBTRACT)


solid = f1.part
